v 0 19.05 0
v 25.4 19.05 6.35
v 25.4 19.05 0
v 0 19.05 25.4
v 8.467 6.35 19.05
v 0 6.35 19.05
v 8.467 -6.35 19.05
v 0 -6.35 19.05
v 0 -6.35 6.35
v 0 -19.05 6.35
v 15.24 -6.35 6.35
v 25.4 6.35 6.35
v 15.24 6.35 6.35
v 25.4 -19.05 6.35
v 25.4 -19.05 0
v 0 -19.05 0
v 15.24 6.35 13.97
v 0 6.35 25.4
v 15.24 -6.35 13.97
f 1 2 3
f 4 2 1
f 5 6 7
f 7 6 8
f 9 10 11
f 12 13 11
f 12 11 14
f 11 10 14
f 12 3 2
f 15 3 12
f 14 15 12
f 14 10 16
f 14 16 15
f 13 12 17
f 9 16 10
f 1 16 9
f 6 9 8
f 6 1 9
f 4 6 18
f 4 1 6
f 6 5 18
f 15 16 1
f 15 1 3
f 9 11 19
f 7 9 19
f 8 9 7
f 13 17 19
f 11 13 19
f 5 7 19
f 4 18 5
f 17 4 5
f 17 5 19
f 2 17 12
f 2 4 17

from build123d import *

# Parameters (mm, degrees)
F0_W     = 25.4
F0_H     = 6.35
F1_DEPTH = 19.05
F3_DEPTH = 12.7
F4_W     = 12.7
F4_H     = 12.7
F5_DEPTH = 15.24
F6_DEPTH = 25.4


with BuildPart() as f1:
    # F0 (on Front) → F1 (new body, symmetric)
    with BuildSketch(Plane.XZ):
        with Locations((12.7, 3.175)):
            Rectangle(F0_W, F0_H)
    extrude(amount=F1_DEPTH, both=True)

    # F2 (on face) → F3 (join)
    with BuildSketch(Plane(origin=(0, 19.05, 0), x_dir=(-1, 0, 0), z_dir=(0, 1, 0))):
        Polygon((-25.4, 6.35), (0, 6.35), (0, 25.4), align=None)
    extrude(amount=-F3_DEPTH)

    # F4 (on face) → F5 (join)
    with BuildSketch(Plane(origin=(0, 0, 0), x_dir=(0, -1, 0), z_dir=(-1, 0, 0))):
        with Locations((0, 12.7)):
            Rectangle(F4_W, F4_H)
    extrude(amount=-F5_DEPTH)

    # F6 (cut): a face of the model
    f6_faces = [f1.faces().sort_by_distance(p)[0] for p in [
        (12.9822222222, 6.35, 17.3566666667),
    ]]
    extrude(f6_faces, amount=-F6_DEPTH, mode=Mode.SUBTRACT)


solid = f1.part
